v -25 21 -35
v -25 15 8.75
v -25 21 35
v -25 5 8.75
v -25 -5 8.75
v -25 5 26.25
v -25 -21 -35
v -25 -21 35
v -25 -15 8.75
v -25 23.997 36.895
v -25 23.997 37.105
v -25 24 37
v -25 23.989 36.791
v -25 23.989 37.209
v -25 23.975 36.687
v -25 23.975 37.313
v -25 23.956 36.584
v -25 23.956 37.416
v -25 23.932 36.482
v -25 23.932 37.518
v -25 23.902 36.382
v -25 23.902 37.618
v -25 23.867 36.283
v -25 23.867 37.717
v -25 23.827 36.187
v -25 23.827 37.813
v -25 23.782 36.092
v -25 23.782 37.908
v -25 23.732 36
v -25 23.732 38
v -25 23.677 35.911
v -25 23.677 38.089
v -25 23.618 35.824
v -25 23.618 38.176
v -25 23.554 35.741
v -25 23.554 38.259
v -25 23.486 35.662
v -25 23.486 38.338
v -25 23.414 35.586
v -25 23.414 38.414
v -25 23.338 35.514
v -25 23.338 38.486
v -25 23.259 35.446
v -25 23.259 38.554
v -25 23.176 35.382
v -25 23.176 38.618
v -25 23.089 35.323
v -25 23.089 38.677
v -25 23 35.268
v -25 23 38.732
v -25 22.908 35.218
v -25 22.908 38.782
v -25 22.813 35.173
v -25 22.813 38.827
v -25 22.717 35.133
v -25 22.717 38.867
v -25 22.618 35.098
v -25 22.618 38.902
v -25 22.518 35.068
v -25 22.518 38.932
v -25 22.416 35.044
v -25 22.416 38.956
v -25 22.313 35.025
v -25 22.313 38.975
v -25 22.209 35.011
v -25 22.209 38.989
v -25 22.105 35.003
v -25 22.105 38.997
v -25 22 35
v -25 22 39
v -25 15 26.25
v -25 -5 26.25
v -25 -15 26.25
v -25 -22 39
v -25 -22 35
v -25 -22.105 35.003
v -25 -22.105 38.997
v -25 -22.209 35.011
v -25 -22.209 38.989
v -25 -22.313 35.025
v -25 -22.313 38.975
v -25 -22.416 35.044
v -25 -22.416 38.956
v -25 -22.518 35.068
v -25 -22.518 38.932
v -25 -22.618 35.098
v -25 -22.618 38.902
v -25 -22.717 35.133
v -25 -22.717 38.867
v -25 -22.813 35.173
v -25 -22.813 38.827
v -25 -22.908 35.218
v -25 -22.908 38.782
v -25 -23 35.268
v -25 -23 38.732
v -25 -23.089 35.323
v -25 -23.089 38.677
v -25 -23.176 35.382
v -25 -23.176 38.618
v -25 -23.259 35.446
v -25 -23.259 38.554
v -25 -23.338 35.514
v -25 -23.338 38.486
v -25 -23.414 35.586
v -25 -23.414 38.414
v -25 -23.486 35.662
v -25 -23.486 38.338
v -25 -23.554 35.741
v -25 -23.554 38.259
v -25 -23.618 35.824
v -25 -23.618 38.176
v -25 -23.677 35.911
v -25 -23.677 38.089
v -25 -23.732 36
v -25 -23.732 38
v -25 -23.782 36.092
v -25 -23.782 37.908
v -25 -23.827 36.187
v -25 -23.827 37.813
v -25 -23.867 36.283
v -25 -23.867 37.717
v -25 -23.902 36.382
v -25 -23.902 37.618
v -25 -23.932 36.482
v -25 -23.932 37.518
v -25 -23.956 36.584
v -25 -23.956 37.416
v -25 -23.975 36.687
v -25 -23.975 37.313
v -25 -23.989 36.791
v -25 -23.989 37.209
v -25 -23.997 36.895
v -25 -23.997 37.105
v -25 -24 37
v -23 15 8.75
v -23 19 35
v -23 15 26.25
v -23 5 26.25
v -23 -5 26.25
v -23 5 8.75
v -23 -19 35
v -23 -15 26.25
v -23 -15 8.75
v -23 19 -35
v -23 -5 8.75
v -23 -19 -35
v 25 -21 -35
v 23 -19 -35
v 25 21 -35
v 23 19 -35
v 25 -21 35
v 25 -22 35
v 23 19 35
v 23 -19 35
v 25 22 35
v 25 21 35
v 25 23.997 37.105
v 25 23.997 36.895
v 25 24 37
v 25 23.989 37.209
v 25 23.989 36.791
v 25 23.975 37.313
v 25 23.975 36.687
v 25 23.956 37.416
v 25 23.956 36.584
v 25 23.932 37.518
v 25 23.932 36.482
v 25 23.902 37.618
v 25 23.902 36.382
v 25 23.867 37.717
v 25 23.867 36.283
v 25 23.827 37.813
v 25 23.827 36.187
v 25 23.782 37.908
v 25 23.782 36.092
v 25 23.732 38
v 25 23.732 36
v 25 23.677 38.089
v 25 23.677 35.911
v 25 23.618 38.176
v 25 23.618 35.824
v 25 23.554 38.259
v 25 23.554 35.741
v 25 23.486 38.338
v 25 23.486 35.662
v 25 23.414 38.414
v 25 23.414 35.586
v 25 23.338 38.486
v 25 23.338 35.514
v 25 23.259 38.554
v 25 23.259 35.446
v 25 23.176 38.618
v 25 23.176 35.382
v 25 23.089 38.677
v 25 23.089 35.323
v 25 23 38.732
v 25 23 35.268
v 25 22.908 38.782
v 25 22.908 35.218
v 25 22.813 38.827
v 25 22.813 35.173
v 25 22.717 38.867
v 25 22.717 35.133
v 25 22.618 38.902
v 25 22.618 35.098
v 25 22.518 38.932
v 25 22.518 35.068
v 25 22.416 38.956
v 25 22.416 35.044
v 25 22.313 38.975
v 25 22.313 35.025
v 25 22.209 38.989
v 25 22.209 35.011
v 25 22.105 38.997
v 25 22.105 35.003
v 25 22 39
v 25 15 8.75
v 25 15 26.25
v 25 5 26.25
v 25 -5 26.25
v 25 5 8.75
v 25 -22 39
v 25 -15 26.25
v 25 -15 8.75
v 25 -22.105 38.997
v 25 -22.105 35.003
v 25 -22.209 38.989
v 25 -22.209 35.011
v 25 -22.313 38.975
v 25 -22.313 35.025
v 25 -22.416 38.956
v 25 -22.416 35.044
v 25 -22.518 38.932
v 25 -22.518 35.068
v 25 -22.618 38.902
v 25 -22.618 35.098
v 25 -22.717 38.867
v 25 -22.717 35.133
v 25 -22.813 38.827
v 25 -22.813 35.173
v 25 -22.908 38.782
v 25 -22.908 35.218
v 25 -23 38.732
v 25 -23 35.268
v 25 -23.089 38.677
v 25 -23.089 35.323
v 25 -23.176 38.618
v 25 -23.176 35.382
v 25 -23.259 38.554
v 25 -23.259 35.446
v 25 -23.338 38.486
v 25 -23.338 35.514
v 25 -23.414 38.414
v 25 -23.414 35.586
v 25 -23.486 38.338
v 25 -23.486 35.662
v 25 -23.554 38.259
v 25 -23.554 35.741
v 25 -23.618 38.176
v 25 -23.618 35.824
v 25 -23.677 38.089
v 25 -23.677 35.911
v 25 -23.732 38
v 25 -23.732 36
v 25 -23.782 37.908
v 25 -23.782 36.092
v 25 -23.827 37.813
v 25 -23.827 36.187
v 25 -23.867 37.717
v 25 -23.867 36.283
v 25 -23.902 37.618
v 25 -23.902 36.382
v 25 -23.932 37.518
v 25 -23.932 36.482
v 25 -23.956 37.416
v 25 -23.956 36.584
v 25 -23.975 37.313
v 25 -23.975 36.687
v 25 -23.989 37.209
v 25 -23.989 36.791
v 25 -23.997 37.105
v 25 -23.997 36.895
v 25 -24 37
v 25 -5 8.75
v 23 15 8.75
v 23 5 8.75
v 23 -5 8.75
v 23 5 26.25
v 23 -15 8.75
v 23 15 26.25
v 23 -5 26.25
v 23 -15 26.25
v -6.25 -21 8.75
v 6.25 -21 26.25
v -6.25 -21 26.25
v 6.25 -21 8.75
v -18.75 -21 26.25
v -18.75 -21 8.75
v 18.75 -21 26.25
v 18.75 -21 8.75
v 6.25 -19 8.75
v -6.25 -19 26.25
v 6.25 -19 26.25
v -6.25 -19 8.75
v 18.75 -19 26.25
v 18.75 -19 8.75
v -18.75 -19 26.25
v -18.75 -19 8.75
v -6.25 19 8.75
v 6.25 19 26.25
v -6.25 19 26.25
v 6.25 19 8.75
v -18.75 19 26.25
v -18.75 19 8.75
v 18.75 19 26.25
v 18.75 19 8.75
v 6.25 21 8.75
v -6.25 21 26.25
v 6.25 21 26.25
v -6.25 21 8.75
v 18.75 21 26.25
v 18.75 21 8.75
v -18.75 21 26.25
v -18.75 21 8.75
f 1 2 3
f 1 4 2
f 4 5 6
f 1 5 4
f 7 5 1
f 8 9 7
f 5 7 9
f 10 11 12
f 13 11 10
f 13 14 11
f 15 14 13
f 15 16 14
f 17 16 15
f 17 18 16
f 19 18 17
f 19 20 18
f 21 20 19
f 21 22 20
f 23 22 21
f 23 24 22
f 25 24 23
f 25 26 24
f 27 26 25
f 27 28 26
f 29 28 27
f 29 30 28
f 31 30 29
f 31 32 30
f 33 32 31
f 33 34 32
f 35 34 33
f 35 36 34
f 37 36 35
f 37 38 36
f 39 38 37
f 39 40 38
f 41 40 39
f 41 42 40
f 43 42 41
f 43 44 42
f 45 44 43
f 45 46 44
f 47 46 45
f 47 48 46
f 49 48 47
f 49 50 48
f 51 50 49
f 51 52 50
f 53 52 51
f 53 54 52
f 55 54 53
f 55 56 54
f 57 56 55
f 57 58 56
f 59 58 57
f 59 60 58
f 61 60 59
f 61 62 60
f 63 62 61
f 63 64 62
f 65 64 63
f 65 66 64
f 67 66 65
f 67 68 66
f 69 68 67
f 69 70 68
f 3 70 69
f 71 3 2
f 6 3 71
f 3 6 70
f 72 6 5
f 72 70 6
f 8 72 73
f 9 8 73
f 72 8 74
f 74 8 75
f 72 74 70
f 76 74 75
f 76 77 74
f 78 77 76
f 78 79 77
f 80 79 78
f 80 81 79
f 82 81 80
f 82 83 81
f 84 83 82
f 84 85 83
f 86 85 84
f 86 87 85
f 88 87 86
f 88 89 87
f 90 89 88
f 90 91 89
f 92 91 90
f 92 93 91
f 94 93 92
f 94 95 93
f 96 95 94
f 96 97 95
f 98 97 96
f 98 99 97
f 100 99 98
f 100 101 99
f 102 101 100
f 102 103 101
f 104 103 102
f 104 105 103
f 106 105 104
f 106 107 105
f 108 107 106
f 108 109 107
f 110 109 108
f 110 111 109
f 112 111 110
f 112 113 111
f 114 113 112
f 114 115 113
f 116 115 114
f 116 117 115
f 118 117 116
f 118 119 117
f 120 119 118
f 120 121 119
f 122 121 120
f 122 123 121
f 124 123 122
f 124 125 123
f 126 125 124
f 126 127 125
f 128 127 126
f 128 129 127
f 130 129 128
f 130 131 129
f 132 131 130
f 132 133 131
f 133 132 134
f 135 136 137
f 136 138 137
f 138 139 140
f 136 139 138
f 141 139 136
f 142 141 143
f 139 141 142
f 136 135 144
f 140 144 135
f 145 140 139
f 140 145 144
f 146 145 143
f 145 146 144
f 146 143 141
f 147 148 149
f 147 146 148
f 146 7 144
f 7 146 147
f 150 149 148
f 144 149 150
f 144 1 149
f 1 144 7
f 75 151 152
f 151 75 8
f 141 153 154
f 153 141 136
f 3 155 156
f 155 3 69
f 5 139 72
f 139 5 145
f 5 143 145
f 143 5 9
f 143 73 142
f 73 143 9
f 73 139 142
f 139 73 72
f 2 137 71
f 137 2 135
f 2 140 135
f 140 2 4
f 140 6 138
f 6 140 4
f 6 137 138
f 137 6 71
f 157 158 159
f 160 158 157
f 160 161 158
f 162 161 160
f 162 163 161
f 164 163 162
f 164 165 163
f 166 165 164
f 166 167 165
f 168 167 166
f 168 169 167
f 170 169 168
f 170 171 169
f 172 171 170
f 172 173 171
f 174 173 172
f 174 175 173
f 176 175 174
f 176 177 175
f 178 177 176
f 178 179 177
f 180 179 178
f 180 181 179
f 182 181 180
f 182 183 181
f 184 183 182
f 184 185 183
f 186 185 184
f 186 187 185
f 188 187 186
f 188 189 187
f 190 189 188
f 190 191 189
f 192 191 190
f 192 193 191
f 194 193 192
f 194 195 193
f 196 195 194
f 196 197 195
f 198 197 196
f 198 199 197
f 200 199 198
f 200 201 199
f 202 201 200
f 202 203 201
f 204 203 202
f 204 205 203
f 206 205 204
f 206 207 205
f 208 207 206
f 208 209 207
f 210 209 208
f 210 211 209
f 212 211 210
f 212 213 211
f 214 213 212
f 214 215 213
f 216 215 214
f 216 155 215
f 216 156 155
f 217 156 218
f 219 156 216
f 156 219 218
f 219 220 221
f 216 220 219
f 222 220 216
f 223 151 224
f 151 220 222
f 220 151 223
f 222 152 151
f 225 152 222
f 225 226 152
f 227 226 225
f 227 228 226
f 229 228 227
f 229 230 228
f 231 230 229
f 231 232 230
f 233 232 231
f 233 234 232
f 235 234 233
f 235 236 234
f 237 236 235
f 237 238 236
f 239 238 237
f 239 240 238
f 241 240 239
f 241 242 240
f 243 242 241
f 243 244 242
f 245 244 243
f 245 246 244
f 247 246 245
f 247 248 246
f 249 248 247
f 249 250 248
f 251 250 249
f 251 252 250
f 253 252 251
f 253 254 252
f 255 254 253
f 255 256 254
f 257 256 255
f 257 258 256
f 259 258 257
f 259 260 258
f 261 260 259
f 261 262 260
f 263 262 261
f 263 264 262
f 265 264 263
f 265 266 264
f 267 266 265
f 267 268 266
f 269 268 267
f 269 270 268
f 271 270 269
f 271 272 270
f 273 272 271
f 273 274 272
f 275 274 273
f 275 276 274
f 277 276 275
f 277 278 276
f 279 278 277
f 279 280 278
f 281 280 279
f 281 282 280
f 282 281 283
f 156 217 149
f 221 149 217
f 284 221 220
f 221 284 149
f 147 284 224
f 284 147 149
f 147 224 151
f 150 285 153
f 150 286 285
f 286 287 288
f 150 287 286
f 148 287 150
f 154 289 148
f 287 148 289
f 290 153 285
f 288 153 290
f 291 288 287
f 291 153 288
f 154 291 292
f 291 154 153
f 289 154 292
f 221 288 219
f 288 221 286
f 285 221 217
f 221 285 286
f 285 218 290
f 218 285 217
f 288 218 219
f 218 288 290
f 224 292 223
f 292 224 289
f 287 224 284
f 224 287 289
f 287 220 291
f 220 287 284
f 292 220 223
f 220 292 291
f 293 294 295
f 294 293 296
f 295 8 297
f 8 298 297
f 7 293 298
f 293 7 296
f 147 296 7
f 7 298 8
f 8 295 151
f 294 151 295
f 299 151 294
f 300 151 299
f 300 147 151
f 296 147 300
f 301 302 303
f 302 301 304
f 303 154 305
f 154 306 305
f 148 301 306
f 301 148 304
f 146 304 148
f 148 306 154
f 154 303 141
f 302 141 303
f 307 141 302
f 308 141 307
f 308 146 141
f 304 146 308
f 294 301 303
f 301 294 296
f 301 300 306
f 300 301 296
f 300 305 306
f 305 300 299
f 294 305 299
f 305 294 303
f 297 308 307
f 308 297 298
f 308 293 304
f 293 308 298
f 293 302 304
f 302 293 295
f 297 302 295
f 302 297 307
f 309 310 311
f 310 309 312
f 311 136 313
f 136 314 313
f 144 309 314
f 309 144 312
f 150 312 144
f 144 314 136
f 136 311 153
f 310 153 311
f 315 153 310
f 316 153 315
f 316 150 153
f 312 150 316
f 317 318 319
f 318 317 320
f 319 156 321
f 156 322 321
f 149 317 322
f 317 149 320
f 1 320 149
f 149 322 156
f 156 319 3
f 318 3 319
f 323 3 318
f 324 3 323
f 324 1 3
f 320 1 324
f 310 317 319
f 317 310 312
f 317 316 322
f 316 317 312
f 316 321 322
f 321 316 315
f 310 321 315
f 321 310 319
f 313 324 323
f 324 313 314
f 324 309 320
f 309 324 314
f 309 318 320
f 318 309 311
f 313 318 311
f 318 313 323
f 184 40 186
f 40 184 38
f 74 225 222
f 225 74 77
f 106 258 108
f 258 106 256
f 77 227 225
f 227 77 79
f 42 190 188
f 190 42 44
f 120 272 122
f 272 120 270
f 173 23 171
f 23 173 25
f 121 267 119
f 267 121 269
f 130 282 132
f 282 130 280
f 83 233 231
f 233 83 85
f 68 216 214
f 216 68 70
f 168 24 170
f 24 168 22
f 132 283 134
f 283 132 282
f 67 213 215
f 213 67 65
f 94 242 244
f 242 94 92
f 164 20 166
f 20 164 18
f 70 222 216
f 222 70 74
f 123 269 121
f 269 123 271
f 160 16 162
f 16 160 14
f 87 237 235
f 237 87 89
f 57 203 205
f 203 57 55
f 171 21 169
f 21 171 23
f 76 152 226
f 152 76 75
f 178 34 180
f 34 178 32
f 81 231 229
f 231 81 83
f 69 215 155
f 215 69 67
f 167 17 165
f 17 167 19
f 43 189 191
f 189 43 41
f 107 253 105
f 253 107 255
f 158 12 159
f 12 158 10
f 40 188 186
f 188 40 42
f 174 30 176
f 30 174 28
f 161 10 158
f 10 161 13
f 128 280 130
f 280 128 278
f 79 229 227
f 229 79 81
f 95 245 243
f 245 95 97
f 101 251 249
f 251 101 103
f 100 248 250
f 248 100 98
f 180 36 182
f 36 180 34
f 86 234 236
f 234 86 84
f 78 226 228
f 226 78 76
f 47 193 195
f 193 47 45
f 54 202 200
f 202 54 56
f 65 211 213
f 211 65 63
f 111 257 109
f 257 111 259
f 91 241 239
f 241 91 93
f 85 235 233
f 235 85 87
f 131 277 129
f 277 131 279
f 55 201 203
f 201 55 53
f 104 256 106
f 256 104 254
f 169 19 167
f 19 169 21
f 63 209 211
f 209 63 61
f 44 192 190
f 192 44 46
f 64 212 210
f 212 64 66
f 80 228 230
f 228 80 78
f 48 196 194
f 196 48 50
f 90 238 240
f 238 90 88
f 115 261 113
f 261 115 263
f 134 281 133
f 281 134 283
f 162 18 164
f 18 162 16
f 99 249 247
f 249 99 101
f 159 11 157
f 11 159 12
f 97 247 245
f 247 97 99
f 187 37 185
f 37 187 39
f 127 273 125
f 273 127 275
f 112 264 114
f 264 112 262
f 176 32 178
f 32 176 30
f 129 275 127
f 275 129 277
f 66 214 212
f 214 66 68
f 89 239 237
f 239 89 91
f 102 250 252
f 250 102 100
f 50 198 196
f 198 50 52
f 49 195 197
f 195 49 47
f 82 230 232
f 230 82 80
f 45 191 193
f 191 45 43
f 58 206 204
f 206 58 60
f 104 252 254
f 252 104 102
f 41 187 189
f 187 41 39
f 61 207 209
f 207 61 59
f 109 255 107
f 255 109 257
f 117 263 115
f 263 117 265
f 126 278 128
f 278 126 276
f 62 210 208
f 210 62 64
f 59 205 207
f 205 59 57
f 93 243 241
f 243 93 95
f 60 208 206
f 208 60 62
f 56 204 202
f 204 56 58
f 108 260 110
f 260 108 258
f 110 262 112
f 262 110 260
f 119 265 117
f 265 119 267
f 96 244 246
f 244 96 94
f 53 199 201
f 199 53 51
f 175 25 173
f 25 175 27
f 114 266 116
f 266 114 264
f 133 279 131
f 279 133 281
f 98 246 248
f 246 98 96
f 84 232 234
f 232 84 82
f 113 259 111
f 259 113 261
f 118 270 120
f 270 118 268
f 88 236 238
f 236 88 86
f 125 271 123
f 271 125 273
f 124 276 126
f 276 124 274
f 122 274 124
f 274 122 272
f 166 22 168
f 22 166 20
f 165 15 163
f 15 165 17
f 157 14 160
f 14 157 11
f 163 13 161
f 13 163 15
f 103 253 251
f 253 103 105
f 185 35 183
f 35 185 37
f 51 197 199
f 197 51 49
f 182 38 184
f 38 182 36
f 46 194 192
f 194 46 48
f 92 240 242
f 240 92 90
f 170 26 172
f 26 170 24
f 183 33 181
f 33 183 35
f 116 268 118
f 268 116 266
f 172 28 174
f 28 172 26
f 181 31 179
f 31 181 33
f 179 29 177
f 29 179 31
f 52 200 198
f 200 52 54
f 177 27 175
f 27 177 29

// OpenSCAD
///////////////////////////////////////////////////////////////////////////////
// Filename 		: SteamCabin.scad
// Main Module   	: Train
// Sub-module	: Cabin
// Version  		: v1.0
// Category 		: Transportation
// Modified 		: 14 Sept 2016
// Author   		: Jason Yeo
///////////////////////////////////////////////////////////////////////////////
// Refer to drawing for Train - Dimension parameters.
//
// A SIMPLE CABIN
// 
///////////////////////////////////////////////////////////////////////////////
//wall();
$fn=120;
Cabin();

module Cabin(l1=50, b1=40, h1=70, t1=2)
{
	translate([-l1/2+t1/2,0,0]) rotate([-90,0,-90]) wall(b1,h1,t1,2);
	translate([+l1/2-t1/2,0,0]) rotate([-90,0,+90]) wall(b1,h1,t1,2);
	translate([0,-b1/2,0]) rotate([-90,0,0]) wall(l1,h1,t1,2);
	translate([0,+b1/2,0]) rotate([-90,0,0]) wall(l1,h1,t1,2);
    color("Red")hull(){
	translate([0,-b1/2-t1,h1/2+t1]) rotate([0,90,0]) cylinder(l1, t1, t1, true);
	translate([0,+b1/2+t1,h1/2+t1]) rotate([0,90,0]) cylinder(l1, t1, t1, true);
    }
}

module wall(width = 150, height = 150, thickness = 2, noOfWindows = 2)
{
	windowHeight = height / (noOfWindows + 2);
	windowWidth = width / (noOfWindows + 2);
	echo("width=",width, windowWidth, windowHeight);
	color("Orange")
    translate([0,0,-thickness/2])linear_extrude(thickness)
	difference(){
		square([width, height], center=true);
		for(i=[0:noOfWindows-1])
			translate([width/2-windowWidth-windowWidth*i*2, -height/4, 0]) square([windowWidth, windowHeight], center=true);
	}
}
